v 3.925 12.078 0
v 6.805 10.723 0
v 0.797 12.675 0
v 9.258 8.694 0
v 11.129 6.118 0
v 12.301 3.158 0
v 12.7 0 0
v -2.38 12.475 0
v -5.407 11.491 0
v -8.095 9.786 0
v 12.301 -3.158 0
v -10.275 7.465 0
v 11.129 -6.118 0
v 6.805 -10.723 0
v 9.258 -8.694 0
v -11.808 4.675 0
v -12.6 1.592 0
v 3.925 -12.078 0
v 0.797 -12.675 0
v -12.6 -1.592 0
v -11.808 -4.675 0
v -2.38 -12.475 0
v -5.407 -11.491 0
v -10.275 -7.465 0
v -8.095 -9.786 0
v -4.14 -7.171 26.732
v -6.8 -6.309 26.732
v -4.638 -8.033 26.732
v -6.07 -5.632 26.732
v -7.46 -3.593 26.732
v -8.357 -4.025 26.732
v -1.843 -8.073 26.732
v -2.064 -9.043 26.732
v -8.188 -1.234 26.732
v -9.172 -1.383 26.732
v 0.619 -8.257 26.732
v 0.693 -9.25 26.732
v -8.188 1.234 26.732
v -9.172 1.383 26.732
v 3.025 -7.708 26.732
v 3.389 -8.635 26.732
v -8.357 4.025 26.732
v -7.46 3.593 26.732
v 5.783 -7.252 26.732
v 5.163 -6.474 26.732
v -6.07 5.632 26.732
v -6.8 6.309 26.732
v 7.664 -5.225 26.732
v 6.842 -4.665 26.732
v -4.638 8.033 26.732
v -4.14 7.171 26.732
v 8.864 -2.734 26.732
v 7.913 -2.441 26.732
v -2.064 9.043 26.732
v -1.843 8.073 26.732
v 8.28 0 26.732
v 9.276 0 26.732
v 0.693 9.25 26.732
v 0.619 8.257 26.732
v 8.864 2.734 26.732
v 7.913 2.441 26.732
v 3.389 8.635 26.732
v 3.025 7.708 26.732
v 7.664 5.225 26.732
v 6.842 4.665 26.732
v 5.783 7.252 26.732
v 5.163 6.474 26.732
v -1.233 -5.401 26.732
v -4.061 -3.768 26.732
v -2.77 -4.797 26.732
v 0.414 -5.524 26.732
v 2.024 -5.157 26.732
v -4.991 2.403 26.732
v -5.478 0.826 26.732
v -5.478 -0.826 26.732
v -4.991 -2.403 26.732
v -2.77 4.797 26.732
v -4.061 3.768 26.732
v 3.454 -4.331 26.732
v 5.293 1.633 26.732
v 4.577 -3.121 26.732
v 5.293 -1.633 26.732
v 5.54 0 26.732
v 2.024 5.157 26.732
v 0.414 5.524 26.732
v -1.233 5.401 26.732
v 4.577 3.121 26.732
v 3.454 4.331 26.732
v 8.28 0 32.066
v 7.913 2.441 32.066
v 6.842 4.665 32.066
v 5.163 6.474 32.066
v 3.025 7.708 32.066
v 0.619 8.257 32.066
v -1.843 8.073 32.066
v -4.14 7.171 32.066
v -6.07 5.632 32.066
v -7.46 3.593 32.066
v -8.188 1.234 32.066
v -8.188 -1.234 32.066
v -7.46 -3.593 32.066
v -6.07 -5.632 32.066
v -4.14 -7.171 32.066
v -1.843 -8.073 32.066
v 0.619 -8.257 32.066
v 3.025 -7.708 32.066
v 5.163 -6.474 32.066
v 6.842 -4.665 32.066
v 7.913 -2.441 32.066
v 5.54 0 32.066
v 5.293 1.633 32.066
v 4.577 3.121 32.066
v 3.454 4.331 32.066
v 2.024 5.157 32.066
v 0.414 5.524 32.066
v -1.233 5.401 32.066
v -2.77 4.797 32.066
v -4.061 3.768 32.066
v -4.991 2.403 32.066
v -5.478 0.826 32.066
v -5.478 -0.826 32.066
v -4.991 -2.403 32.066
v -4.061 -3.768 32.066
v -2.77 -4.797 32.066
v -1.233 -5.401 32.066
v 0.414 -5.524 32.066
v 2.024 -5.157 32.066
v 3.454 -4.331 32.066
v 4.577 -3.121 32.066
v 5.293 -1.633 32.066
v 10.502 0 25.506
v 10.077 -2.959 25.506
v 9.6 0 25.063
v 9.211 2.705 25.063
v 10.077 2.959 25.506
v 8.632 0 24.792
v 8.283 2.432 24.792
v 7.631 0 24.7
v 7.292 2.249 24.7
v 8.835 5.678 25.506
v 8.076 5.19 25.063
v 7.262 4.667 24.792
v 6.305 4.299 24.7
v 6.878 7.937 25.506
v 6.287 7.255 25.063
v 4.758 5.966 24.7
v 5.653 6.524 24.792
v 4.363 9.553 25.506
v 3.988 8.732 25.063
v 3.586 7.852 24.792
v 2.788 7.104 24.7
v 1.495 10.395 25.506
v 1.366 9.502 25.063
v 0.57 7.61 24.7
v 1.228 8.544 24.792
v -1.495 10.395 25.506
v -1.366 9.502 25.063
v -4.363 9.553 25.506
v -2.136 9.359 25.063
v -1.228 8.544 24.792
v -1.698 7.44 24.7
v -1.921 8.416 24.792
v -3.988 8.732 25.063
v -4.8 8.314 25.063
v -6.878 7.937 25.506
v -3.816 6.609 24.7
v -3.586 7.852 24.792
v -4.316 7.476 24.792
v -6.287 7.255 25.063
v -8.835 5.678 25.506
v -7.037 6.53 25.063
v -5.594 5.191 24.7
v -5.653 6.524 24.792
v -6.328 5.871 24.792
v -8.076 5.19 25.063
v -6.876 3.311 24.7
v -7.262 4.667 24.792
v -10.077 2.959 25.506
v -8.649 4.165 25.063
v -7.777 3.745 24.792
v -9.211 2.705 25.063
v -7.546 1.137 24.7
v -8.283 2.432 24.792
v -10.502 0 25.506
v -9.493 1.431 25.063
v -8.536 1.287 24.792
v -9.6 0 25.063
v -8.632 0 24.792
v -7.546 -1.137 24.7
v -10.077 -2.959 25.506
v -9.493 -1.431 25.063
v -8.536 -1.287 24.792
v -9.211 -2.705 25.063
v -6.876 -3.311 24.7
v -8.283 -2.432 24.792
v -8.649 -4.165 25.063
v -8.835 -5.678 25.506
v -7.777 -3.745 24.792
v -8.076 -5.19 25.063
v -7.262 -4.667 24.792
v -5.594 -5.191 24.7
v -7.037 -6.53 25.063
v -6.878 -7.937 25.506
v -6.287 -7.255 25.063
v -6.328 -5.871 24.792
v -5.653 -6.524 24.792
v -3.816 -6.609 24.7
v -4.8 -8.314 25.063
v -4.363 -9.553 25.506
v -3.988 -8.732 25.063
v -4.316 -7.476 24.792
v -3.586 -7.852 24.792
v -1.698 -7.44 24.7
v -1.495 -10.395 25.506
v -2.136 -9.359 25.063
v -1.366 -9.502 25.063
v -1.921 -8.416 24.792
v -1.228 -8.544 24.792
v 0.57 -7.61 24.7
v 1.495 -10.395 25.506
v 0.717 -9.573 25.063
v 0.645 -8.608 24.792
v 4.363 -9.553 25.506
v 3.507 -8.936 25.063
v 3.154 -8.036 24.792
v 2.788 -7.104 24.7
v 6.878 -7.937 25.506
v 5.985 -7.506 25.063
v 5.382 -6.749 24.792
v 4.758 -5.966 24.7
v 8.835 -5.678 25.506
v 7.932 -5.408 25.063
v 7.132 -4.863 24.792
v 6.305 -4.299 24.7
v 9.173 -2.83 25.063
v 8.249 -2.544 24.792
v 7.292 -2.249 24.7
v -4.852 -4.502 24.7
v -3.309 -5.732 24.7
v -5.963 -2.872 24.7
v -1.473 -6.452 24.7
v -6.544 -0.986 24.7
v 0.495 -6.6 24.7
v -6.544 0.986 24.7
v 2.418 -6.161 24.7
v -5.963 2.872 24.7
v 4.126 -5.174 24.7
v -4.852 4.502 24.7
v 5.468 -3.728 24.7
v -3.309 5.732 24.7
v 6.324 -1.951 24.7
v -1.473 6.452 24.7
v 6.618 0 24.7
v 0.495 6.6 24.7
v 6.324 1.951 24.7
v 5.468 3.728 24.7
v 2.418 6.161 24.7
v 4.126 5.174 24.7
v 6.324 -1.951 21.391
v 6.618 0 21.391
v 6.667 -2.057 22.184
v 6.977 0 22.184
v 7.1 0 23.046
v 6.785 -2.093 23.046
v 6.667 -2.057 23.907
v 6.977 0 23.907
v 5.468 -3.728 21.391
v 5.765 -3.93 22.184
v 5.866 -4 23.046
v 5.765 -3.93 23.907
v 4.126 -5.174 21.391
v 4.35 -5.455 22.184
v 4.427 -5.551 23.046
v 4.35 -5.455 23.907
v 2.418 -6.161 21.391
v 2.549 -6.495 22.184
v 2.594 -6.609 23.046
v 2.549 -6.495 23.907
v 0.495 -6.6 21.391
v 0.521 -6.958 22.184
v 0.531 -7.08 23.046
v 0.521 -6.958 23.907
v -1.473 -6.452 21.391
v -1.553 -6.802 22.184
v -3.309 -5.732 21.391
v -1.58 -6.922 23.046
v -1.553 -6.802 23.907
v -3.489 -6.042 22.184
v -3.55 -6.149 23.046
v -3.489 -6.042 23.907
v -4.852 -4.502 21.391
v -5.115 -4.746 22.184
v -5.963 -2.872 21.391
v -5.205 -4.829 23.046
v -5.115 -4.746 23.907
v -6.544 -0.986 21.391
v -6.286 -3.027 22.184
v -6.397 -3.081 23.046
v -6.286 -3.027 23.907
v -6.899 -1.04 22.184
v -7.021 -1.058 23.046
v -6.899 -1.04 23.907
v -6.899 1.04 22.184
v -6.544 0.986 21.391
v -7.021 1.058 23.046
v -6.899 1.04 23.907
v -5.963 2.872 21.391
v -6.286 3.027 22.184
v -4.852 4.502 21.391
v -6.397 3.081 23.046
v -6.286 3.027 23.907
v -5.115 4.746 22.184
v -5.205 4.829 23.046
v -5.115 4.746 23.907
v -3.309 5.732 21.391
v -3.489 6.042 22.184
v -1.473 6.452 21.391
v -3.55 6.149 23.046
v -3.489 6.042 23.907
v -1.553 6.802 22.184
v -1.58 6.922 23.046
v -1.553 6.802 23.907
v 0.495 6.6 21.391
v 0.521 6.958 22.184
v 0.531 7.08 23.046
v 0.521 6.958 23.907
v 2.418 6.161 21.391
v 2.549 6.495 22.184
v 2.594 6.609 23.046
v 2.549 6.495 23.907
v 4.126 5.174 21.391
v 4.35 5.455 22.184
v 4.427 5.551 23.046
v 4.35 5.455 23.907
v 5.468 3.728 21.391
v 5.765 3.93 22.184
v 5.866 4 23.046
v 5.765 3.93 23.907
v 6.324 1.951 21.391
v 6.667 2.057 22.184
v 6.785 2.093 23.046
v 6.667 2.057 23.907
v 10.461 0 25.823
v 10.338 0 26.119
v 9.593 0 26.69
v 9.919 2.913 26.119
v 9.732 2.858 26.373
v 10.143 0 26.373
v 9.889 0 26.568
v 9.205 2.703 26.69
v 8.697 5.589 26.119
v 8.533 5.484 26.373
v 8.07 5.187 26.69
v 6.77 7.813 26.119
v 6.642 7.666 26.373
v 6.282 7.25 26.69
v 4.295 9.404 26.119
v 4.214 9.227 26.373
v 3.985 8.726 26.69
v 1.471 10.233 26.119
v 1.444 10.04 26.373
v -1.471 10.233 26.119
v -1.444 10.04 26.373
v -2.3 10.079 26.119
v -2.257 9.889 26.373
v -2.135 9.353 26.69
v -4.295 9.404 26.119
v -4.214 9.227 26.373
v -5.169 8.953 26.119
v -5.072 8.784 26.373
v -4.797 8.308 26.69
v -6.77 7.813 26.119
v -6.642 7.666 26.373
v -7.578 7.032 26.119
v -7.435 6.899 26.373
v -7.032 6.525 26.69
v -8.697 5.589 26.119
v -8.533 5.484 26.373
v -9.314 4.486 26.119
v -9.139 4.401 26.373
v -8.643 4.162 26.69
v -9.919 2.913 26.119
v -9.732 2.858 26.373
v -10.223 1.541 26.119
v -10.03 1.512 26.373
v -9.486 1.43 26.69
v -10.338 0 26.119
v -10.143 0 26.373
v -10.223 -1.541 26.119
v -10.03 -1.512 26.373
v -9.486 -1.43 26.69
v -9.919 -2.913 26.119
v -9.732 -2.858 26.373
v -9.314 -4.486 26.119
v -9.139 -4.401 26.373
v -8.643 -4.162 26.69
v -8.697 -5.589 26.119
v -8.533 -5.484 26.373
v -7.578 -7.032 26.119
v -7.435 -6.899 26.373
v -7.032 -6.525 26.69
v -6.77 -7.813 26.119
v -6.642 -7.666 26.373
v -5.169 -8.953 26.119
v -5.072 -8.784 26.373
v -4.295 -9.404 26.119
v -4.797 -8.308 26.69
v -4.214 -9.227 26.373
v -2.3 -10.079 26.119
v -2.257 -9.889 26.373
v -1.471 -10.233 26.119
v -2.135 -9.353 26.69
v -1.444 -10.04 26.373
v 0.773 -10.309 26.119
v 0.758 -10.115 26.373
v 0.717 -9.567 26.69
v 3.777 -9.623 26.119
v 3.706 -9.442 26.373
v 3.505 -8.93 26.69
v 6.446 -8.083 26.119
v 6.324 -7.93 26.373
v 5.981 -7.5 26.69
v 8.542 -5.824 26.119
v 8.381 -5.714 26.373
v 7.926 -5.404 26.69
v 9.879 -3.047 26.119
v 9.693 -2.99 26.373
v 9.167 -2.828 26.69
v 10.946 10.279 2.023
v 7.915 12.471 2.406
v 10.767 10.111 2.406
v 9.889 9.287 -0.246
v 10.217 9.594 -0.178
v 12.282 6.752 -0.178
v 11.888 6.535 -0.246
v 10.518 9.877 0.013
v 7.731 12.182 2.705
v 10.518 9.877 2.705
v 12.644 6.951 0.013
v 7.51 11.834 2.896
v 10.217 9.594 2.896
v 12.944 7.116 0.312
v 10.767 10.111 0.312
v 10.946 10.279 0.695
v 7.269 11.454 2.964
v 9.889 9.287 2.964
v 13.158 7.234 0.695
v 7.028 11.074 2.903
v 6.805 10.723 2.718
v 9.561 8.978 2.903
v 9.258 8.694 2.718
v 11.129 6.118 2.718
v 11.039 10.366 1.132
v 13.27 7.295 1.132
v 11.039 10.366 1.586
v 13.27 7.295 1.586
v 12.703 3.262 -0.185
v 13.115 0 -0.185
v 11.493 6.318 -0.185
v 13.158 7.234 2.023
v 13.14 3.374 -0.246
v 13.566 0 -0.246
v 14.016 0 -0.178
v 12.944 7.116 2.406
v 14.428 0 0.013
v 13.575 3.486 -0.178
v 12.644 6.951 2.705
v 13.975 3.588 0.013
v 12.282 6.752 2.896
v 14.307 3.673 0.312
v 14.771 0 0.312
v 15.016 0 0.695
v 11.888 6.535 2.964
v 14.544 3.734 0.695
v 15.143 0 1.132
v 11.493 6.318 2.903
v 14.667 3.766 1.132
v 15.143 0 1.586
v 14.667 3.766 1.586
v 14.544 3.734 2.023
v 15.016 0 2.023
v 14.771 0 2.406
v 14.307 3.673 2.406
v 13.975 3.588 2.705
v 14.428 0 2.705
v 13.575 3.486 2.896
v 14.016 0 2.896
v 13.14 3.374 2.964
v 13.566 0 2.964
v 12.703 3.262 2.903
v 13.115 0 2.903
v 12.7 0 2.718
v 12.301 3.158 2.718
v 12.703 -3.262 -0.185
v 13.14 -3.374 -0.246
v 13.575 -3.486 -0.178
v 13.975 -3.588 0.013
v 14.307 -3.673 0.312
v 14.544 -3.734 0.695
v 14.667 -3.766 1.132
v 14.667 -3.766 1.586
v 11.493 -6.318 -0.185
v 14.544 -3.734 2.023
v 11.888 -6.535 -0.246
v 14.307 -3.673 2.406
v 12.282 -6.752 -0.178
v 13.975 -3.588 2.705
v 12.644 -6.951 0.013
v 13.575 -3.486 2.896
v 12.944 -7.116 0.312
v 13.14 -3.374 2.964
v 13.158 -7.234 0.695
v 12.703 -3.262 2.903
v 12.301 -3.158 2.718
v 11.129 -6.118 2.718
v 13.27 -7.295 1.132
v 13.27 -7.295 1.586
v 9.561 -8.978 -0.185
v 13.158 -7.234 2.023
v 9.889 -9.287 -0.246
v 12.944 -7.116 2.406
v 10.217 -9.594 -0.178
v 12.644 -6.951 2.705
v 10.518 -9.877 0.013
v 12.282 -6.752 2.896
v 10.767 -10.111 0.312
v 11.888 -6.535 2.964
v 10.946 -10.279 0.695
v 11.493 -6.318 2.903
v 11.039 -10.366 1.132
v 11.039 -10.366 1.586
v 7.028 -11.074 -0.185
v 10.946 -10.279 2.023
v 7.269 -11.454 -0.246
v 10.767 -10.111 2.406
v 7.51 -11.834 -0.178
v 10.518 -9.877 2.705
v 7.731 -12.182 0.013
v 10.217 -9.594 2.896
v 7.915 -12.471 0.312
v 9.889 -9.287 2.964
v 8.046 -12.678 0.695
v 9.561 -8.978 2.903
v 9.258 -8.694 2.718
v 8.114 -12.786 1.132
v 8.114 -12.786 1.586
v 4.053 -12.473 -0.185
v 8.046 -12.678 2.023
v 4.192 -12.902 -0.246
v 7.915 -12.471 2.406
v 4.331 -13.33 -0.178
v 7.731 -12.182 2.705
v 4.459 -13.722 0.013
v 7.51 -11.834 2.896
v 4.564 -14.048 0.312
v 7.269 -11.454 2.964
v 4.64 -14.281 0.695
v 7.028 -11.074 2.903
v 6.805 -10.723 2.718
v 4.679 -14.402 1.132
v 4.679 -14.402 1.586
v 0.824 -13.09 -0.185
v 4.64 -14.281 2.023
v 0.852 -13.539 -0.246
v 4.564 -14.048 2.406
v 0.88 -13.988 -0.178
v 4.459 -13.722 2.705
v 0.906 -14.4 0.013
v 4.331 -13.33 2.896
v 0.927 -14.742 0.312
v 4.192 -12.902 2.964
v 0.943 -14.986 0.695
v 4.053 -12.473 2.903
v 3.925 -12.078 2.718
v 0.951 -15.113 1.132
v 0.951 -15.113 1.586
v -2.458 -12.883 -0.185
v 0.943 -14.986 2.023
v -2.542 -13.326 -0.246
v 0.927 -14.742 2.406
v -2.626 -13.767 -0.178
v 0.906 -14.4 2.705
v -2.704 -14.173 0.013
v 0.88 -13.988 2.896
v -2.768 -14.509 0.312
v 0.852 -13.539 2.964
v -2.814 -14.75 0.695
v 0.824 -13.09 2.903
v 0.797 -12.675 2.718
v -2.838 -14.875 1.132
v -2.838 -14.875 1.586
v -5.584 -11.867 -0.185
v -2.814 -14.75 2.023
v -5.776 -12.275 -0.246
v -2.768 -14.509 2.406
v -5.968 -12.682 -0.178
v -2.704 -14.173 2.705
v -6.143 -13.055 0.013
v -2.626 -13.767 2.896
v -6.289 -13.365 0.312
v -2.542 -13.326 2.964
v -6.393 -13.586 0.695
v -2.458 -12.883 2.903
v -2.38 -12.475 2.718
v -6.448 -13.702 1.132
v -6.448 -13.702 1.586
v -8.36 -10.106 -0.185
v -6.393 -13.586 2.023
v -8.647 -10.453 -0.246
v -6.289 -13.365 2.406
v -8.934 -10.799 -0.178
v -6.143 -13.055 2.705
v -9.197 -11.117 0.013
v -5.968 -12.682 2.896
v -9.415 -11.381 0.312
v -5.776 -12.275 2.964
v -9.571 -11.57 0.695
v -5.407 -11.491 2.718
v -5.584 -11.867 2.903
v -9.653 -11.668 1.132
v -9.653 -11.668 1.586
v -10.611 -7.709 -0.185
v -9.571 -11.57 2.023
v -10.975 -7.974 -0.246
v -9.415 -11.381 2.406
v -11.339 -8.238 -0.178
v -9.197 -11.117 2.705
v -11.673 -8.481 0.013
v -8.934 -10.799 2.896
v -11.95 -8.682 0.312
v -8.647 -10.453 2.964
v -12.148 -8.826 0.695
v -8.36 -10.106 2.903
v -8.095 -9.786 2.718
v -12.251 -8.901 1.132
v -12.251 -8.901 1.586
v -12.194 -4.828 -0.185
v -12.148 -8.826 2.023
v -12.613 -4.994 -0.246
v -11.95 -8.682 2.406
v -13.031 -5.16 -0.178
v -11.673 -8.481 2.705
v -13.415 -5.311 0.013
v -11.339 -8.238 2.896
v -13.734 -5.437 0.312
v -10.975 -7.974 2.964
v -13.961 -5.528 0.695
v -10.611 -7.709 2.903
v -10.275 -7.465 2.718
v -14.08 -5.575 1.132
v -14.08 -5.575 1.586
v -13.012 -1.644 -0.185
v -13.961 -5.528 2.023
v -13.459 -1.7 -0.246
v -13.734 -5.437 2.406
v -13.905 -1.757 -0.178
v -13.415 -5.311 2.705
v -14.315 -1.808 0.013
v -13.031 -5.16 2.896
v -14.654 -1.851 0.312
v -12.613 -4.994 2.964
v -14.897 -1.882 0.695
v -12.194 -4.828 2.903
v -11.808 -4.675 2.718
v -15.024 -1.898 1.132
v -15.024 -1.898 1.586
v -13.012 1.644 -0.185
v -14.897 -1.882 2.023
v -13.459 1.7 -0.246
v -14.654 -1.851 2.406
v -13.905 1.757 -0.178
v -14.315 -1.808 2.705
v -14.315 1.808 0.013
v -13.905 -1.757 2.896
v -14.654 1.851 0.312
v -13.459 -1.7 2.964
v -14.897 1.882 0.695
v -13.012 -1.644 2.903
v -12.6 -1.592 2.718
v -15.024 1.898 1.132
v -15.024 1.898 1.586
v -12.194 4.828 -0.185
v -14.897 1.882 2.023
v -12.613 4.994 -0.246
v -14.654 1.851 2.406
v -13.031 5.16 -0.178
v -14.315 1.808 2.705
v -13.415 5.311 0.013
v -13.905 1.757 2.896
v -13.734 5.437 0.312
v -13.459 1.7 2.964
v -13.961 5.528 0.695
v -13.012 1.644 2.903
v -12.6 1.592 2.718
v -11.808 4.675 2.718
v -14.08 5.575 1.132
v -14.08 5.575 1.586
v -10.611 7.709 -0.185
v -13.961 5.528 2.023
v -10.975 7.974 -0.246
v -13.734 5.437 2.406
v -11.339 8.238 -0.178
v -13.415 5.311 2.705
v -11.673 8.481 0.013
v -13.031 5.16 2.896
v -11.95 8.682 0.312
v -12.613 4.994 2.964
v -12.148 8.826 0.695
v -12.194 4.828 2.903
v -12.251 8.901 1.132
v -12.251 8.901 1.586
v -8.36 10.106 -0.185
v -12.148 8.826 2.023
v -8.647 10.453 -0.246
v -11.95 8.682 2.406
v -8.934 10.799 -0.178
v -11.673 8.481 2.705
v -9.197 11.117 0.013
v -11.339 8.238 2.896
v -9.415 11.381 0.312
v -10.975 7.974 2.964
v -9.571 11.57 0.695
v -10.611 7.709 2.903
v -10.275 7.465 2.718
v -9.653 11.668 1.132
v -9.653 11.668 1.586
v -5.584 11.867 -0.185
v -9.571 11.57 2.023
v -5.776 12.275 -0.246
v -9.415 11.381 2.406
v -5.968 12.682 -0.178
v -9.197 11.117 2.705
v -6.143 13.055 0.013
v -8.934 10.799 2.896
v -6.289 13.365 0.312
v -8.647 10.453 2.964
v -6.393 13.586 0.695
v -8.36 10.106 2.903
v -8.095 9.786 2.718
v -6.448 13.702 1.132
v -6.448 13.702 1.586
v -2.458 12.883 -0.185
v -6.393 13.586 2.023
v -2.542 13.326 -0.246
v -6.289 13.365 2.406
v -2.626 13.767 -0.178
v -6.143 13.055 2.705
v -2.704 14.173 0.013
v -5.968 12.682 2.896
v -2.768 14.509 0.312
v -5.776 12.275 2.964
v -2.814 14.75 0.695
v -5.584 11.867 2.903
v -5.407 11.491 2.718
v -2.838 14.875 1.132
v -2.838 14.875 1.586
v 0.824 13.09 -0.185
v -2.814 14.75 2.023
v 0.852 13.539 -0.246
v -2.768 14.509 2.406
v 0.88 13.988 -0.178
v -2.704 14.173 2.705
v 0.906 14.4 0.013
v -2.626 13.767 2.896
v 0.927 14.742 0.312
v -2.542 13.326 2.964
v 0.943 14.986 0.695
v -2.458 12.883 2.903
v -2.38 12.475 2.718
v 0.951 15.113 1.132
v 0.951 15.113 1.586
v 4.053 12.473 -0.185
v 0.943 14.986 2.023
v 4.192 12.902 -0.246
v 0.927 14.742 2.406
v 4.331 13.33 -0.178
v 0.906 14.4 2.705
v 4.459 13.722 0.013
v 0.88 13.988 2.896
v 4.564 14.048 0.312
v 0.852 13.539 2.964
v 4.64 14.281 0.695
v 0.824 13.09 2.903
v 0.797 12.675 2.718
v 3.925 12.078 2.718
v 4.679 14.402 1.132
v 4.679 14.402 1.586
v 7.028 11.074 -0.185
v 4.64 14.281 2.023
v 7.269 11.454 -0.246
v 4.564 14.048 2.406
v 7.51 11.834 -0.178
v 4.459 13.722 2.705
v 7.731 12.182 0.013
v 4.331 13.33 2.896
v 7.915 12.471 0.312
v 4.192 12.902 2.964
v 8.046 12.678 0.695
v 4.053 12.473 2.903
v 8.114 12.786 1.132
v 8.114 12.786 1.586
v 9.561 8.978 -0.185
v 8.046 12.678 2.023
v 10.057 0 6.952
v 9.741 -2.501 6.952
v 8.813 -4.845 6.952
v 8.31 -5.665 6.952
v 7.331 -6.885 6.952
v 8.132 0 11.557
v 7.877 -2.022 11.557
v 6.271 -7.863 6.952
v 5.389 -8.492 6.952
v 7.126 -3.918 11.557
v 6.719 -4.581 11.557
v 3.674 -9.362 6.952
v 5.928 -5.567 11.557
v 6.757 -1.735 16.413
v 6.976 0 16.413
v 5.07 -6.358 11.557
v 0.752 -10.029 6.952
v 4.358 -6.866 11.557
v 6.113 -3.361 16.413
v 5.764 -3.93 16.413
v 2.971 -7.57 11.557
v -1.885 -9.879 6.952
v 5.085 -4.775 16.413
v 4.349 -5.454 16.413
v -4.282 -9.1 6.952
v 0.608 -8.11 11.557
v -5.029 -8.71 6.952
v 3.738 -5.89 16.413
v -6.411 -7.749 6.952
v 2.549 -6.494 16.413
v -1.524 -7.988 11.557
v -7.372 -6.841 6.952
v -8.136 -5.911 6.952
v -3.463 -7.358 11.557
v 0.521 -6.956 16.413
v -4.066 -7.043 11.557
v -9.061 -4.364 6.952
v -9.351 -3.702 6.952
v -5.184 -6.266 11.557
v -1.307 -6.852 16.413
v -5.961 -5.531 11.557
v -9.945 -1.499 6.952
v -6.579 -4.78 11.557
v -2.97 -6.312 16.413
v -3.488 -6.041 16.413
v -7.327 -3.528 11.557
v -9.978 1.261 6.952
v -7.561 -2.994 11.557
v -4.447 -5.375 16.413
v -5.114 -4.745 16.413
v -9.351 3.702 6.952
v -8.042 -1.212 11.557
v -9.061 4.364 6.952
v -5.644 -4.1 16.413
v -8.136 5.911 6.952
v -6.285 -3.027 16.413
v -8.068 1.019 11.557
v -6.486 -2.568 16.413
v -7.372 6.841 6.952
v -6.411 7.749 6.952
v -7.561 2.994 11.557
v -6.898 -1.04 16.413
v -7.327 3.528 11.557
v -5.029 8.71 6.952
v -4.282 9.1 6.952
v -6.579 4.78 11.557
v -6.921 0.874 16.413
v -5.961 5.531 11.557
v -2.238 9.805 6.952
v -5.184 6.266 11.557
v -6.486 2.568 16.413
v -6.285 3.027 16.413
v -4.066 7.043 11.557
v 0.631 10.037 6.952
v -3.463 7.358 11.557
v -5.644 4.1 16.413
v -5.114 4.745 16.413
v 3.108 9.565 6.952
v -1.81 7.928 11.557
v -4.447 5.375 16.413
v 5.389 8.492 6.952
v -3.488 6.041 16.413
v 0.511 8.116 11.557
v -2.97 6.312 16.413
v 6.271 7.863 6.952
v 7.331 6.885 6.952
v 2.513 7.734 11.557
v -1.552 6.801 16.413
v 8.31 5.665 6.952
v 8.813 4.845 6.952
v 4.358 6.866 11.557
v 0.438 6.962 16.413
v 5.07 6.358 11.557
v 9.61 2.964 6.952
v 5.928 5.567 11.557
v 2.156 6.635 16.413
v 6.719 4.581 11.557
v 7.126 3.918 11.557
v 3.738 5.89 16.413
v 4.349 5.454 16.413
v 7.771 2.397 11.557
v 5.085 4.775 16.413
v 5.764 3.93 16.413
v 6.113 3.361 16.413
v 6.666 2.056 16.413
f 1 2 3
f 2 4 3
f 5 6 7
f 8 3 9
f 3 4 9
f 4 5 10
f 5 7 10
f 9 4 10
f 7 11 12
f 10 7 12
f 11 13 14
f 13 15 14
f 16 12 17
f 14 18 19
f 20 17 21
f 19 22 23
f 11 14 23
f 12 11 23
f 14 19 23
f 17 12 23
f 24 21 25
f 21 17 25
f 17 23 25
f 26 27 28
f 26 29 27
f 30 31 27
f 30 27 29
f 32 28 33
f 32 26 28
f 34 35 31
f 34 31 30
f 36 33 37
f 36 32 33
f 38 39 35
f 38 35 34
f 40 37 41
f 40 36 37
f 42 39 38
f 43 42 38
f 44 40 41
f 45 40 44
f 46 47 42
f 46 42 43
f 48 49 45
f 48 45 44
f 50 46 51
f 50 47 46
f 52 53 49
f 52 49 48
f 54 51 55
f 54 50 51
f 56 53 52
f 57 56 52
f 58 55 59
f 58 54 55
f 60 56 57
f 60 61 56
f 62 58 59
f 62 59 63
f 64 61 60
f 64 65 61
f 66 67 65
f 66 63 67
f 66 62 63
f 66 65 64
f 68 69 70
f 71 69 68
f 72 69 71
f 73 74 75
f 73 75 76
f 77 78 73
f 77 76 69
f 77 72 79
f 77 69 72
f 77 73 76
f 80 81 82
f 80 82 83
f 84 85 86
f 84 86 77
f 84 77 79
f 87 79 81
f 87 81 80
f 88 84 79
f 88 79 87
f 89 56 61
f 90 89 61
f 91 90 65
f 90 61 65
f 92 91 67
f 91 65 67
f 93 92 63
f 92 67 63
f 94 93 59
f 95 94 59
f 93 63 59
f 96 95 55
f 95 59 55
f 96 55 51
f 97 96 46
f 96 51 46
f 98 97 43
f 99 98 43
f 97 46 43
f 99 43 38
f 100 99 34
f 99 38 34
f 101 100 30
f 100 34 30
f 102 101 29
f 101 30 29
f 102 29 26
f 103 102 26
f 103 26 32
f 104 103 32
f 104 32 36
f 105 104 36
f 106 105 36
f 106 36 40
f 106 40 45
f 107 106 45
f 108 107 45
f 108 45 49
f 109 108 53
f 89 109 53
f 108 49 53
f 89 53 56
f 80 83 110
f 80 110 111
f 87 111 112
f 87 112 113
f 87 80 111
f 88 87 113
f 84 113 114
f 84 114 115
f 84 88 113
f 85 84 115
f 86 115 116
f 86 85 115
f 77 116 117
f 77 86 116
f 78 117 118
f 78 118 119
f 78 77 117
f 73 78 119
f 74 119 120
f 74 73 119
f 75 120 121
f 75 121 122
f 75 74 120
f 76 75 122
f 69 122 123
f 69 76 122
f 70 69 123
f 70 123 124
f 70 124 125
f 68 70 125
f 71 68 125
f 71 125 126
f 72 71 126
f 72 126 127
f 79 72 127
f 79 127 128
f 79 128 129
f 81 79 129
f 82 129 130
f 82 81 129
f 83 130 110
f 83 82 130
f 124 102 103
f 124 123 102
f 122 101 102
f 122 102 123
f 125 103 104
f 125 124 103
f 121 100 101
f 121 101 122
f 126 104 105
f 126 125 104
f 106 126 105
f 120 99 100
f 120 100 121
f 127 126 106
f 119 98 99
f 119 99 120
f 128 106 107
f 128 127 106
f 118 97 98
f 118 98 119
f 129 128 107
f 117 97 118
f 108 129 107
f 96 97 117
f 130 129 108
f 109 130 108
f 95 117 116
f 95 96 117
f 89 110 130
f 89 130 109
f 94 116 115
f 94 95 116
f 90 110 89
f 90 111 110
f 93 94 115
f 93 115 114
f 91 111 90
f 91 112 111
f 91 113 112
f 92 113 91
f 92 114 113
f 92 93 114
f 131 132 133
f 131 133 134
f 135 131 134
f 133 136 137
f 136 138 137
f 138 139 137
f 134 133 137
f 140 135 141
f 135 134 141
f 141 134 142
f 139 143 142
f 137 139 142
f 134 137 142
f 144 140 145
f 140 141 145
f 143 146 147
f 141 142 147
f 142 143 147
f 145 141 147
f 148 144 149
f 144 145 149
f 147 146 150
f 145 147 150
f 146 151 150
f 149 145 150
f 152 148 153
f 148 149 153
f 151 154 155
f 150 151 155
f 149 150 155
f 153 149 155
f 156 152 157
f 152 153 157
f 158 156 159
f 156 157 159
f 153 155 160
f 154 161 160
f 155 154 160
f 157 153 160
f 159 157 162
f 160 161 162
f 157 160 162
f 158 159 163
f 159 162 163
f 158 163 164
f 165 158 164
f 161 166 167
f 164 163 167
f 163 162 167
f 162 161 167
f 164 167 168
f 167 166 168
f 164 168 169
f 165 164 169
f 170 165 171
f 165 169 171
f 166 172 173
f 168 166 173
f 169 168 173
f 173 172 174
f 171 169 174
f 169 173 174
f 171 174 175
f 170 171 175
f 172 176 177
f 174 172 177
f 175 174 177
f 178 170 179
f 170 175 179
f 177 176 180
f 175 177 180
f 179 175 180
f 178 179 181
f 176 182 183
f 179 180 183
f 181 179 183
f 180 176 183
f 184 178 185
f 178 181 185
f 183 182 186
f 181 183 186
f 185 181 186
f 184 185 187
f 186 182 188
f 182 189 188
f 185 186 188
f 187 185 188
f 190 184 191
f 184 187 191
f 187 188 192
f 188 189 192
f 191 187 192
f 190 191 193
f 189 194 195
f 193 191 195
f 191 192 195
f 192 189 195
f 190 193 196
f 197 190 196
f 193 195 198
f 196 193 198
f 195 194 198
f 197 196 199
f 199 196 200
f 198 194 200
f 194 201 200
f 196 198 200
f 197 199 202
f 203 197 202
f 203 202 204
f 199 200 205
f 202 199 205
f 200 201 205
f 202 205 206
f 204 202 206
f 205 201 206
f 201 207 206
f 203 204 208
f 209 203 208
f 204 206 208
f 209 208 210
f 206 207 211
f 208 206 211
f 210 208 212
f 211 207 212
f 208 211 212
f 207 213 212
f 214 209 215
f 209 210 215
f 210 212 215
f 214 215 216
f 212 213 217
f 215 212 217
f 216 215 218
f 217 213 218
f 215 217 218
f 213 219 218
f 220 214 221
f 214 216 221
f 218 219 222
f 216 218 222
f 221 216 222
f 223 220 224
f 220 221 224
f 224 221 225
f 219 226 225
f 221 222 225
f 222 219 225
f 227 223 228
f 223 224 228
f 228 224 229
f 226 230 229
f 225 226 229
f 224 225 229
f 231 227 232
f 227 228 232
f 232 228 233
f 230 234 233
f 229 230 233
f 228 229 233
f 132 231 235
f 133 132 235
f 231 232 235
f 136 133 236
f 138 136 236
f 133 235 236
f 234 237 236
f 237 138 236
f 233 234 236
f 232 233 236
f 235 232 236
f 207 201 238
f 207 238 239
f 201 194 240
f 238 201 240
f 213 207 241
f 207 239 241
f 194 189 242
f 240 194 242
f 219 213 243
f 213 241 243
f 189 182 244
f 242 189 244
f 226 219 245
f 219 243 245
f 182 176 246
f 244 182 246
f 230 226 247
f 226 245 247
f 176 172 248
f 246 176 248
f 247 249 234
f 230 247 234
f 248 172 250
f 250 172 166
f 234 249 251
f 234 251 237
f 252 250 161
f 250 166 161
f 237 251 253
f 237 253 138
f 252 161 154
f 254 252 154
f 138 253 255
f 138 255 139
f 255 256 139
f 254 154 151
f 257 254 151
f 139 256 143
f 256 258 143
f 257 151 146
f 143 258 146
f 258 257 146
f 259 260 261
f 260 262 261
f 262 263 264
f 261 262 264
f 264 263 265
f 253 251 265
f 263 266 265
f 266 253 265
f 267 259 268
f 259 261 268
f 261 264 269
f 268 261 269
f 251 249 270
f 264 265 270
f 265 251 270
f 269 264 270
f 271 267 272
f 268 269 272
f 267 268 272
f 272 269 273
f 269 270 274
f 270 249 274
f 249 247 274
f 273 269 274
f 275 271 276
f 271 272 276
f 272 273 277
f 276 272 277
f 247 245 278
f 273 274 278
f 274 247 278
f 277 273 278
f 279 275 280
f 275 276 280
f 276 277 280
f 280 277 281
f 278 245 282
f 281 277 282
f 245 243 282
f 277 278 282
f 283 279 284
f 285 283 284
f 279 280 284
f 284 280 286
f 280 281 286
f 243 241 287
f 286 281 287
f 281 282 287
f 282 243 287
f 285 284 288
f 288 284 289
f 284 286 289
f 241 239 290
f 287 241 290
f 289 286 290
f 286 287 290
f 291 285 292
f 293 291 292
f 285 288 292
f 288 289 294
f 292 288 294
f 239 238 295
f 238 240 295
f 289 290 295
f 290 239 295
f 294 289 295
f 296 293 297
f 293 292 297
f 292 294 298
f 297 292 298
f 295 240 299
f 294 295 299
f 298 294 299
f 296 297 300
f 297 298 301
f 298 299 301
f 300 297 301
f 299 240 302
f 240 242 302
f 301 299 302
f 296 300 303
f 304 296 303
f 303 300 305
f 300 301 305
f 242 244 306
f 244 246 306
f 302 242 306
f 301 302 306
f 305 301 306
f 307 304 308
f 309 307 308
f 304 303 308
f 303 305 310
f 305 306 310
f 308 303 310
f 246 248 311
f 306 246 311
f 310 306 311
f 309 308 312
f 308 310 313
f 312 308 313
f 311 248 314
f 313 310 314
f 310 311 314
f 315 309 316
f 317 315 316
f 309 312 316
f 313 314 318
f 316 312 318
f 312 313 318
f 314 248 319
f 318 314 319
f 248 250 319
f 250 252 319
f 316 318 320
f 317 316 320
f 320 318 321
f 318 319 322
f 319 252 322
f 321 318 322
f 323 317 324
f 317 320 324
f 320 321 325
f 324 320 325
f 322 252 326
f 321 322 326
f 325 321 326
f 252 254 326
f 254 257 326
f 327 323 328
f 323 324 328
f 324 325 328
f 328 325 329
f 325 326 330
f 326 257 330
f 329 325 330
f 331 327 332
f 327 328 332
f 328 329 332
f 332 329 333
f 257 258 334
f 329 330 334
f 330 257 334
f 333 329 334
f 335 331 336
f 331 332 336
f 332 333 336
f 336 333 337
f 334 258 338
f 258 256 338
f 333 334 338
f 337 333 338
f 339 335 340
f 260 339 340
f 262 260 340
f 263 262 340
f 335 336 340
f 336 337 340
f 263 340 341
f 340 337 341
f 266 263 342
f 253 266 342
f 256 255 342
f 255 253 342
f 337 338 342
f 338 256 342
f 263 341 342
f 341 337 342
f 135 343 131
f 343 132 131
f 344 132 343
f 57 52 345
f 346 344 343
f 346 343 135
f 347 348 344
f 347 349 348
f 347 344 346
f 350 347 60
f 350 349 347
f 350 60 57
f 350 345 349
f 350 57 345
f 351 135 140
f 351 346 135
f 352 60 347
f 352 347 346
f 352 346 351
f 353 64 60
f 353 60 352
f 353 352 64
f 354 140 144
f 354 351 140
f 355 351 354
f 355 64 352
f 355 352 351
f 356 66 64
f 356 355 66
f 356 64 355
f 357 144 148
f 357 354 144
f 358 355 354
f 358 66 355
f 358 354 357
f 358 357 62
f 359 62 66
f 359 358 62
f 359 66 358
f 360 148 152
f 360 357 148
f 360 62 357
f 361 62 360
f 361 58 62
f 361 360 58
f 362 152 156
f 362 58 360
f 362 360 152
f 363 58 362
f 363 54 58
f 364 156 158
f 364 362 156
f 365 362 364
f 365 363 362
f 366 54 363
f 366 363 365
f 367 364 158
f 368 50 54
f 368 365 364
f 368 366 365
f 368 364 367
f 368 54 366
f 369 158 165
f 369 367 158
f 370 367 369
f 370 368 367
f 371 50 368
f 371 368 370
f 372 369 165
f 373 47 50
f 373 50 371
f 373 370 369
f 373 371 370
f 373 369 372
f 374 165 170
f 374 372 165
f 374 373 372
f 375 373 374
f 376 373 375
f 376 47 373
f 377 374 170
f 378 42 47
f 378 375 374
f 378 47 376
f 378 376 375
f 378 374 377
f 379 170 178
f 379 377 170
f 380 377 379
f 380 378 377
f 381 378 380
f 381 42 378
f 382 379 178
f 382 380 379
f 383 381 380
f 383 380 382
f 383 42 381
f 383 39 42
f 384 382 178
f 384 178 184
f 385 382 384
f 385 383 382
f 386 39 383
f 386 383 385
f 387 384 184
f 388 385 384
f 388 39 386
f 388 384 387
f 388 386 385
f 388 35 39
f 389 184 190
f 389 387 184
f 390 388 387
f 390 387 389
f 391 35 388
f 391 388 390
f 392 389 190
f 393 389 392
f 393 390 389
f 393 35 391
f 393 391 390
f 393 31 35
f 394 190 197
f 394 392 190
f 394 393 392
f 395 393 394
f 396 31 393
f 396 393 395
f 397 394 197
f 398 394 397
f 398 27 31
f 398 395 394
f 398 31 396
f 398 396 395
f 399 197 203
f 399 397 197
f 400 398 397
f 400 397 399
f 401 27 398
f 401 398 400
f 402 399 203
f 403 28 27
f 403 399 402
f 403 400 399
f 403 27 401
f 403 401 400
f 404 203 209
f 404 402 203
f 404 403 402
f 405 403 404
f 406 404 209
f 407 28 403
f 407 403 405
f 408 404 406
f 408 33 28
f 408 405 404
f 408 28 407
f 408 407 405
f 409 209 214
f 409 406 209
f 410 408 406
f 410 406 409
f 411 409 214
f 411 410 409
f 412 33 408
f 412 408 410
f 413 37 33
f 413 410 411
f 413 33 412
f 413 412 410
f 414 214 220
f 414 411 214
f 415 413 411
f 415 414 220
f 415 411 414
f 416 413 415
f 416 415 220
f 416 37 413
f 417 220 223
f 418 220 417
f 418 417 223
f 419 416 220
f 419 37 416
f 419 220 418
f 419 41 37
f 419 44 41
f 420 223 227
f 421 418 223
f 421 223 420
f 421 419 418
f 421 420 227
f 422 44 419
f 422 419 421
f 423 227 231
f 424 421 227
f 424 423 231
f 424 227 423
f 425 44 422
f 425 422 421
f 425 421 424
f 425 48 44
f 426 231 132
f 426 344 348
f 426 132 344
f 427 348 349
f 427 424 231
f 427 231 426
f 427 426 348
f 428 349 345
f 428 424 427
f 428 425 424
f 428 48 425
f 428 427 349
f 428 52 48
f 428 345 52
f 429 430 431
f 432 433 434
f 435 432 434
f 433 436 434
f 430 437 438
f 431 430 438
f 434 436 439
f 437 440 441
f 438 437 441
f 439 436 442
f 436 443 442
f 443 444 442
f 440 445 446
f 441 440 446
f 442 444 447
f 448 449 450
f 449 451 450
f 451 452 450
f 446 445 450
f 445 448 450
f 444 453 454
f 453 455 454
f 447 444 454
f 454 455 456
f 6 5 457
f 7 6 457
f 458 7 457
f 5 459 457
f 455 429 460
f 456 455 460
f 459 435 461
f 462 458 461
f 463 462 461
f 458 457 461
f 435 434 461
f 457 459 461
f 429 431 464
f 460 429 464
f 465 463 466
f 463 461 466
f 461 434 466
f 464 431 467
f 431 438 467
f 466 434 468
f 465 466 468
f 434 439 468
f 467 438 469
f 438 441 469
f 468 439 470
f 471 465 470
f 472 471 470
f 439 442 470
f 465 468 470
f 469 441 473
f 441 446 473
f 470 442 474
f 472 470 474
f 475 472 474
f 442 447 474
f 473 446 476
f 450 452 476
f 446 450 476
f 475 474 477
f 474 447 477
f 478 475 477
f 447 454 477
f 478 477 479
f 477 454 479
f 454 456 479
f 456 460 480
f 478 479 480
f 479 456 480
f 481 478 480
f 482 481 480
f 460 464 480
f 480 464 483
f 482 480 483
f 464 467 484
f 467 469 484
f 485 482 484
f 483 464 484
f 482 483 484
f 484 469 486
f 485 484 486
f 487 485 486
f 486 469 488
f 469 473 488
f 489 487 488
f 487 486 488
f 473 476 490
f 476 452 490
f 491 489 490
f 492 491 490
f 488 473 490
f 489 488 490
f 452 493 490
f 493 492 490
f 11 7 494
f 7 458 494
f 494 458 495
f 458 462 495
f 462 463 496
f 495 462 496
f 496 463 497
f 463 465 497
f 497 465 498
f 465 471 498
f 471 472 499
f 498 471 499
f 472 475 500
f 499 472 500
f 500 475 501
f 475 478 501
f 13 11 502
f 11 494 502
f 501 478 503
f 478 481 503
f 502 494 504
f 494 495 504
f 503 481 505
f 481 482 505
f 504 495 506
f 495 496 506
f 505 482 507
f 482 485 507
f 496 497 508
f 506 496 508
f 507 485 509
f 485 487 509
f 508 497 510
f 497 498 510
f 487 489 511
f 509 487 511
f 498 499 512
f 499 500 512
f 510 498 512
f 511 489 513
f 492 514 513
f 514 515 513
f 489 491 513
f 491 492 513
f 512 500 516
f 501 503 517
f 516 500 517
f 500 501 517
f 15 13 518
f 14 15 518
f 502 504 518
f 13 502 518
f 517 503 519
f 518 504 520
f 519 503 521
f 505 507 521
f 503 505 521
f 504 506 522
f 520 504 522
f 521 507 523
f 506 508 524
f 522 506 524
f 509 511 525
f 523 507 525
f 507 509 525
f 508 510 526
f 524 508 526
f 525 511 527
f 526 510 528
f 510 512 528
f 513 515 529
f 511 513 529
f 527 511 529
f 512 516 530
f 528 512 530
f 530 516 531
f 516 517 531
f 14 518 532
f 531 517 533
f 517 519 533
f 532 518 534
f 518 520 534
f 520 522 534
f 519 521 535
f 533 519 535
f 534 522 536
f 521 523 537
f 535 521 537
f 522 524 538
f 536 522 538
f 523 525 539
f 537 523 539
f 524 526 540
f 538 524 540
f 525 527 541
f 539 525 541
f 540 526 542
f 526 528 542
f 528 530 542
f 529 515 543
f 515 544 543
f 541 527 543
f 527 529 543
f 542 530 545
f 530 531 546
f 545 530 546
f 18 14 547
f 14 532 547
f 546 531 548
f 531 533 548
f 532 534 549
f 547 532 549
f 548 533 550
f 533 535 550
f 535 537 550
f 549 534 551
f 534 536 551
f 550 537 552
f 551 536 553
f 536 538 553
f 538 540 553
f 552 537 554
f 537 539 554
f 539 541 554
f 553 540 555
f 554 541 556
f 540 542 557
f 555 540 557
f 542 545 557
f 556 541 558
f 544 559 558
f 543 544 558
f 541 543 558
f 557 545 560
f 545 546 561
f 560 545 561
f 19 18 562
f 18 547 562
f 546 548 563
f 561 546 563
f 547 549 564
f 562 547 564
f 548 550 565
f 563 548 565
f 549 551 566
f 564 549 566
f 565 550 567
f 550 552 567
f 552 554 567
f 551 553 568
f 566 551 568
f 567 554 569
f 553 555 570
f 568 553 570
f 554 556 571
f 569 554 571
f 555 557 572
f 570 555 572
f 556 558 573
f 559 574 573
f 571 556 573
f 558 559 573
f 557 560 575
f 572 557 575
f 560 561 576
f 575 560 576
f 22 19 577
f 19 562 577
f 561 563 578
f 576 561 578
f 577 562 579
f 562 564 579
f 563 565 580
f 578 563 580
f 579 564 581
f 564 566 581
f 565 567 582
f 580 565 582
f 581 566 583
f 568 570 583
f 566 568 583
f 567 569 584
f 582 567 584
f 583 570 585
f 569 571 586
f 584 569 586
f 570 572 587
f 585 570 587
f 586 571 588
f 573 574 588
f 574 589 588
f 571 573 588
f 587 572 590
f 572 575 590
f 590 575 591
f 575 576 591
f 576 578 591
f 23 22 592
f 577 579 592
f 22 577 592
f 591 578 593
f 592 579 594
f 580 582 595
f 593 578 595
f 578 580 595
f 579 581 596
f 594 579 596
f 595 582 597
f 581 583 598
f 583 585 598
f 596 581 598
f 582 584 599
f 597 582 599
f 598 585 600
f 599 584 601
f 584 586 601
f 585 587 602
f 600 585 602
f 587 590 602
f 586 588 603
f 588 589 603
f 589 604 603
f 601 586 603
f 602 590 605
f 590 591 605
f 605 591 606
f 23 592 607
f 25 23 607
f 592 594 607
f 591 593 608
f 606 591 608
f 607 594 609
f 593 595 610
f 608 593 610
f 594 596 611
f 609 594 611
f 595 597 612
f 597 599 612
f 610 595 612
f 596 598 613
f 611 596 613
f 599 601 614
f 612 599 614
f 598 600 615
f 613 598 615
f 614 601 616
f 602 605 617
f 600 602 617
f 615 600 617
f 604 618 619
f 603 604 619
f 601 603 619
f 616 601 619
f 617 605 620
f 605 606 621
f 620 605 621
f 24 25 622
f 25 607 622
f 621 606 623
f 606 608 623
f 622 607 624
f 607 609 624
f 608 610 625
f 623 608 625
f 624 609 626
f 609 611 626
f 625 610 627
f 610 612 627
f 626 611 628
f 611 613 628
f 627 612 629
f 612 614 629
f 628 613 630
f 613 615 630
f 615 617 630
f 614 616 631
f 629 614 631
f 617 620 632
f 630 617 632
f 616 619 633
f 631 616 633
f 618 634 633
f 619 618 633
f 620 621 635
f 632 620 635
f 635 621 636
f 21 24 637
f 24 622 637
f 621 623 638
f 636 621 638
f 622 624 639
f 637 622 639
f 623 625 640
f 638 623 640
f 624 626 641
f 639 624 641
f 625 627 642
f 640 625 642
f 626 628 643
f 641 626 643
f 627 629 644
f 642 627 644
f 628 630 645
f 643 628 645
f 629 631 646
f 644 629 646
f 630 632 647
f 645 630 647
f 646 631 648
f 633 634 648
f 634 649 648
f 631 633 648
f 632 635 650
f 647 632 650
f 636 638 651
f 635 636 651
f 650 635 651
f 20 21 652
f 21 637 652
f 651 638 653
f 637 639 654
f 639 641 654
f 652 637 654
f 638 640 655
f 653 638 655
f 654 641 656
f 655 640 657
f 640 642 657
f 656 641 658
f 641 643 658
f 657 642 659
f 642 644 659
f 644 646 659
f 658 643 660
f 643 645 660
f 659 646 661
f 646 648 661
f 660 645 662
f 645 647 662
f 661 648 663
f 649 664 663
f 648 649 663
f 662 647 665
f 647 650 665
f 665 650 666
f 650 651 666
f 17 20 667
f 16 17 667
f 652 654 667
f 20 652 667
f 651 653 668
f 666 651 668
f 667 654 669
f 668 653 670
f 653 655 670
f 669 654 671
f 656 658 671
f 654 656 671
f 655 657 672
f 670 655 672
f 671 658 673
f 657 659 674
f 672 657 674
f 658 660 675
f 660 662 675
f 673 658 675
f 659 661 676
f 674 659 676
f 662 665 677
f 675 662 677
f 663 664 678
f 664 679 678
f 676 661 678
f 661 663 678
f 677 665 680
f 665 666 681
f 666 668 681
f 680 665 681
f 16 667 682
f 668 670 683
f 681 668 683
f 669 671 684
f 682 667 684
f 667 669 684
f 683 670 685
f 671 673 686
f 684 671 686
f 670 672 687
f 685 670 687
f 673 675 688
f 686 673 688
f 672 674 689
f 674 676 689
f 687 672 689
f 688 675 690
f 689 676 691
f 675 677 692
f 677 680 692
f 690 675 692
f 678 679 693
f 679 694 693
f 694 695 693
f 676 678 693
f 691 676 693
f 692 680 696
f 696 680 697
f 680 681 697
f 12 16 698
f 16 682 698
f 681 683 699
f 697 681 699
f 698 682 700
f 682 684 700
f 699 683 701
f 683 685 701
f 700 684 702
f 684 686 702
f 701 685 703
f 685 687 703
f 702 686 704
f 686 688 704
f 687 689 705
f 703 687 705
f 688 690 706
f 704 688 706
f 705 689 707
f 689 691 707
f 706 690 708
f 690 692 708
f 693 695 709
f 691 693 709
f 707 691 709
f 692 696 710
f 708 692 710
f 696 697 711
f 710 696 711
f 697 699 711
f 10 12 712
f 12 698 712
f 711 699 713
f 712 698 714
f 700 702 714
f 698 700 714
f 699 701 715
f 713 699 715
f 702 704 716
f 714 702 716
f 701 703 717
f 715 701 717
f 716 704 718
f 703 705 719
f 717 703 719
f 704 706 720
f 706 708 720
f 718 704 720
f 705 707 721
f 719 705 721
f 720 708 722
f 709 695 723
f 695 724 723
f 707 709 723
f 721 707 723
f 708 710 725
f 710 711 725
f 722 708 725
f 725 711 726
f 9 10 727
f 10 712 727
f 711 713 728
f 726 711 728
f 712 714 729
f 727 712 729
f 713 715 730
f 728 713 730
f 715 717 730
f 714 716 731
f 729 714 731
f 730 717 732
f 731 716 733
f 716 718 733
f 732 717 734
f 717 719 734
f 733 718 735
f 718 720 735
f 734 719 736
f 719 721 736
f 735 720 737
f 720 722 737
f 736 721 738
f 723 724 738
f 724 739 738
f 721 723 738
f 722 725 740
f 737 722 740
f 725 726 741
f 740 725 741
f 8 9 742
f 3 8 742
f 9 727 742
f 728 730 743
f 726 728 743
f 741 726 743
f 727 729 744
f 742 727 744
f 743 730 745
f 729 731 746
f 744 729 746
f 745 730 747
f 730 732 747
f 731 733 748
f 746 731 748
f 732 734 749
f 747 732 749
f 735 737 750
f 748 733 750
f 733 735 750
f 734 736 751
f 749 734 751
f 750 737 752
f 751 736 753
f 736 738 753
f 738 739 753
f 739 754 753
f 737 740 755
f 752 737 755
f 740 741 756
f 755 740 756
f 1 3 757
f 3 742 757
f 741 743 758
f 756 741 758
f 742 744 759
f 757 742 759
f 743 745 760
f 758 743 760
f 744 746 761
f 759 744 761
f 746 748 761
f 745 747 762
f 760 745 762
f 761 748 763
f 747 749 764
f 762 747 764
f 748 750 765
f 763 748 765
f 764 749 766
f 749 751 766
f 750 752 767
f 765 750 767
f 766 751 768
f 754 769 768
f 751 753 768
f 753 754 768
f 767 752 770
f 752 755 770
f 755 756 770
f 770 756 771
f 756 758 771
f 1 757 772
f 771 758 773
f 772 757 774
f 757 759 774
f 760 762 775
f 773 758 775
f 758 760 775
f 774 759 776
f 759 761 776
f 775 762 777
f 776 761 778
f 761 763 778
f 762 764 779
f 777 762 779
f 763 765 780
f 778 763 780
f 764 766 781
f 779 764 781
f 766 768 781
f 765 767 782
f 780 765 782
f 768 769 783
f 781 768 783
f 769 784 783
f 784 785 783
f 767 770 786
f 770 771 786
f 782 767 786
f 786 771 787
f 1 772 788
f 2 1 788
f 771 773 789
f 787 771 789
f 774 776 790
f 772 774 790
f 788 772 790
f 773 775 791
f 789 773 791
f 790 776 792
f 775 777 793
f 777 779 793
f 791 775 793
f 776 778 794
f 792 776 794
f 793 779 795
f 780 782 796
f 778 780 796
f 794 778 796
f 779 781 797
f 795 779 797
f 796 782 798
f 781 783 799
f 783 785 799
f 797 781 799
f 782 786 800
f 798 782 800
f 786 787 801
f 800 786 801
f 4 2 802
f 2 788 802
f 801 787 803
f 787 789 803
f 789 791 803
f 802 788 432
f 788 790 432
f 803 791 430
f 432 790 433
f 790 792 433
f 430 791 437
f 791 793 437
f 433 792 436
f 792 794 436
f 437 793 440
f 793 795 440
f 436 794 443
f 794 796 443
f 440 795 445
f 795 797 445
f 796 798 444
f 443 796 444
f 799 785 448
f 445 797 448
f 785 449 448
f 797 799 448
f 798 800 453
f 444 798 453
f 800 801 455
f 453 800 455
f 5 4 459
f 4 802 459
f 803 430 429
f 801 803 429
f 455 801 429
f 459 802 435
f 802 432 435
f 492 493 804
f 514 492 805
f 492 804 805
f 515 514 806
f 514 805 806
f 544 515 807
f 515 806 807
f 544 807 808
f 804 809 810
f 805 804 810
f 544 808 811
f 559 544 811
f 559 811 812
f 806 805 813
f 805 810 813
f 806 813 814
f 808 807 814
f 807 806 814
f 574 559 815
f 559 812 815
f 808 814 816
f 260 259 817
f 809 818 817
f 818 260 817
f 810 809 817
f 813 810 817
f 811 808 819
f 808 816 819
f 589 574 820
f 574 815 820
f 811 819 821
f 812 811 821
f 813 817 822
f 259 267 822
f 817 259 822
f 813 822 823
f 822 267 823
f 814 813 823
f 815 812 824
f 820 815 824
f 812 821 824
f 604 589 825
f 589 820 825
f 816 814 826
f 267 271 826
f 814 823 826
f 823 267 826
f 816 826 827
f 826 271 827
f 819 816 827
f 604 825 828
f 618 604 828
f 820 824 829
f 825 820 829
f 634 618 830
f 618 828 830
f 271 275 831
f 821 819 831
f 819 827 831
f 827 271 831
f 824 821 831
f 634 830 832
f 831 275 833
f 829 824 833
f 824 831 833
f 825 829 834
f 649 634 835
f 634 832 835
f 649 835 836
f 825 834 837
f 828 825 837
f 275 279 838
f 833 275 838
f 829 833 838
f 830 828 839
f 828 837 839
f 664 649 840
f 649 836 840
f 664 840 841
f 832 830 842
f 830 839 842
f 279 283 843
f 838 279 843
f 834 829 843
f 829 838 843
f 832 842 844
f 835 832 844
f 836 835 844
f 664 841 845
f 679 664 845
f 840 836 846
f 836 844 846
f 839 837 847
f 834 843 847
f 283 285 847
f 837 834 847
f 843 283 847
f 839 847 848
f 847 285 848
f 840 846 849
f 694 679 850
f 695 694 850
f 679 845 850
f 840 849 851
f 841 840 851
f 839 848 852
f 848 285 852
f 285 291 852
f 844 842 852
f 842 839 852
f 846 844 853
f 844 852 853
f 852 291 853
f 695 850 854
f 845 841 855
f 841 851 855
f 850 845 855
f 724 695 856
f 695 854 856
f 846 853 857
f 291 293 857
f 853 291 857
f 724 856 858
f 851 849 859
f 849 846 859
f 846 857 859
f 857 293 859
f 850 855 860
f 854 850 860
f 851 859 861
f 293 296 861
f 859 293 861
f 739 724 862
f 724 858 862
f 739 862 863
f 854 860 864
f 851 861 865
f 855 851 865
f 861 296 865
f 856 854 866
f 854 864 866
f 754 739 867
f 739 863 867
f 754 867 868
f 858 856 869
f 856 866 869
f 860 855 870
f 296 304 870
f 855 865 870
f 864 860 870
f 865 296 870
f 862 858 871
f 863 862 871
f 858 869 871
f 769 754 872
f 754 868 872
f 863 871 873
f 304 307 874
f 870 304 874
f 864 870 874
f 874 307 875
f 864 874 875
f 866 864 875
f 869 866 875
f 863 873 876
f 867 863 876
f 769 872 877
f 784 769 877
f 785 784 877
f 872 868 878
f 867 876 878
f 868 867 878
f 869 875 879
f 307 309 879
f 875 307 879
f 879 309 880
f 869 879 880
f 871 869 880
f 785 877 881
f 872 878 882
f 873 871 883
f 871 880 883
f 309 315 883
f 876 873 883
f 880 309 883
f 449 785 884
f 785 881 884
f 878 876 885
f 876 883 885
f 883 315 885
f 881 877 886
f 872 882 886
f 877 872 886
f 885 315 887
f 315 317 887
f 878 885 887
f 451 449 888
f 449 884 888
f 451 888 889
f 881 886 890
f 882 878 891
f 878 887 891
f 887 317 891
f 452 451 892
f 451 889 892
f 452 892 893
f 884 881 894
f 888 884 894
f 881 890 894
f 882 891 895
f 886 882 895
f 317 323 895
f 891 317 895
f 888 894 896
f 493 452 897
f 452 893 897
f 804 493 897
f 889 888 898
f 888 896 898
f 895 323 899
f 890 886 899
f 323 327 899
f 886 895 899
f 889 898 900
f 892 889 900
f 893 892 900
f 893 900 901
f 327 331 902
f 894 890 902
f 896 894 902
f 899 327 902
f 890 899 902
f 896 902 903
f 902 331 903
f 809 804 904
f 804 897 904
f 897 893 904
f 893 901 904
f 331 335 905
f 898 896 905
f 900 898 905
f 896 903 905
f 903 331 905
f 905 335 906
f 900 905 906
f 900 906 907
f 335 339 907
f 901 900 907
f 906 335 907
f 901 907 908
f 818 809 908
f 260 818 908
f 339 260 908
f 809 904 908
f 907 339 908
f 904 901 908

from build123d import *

# Parameters (mm, degrees)
F2_R     = 10.5023561171
F3_DEPTH = 2.032
F4_R     = 1.2264204897
F6_R     = 8.280415088
F6_R_2   = 5.5395009723
F7_DEPTH = 5.334


# Not quite as in the source:
# - a fillet or chamfer that OpenCascade refuses, or shapes differently, is made with other operations: its cross-section is extruded or revolved along the edge and cut away or added


with BuildPart() as f1:
    # F0 (on Front) → F1 (revolve)
    with BuildSketch(Plane.XZ):
        with BuildLine():
            Line((0, 24.7002821416), (0, 0))
            Line((0, 0), (12.7, 0))
            ThreePointArc((12.7, 0), (15.1592770153, 1.3591062743), (12.7, 2.7182125486))
            ThreePointArc((12.7, 2.7182125486), (8.1323573281, 11.5574154189), (6.618256215, 21.3911514729))
            ThreePointArc((6.618256215, 21.3911514729), (7.1000680202, 23.0457168072), (6.618256215, 24.7002821416))
            Line((6.618256215, 24.7002821416), (0, 24.7002821416))
        make_face()
    revolve(axis=Axis((0, 0, 12.3501410708), (0, 0, -1)))

    # F2 (on face) → F3 (join)
    with BuildSketch(Plane.XY.offset(24.7002821416)):
        Circle(F2_R)
    extrude(amount=F3_DEPTH)

    # F4
    f4_edges = [f1.edges().sort_by_distance(p)[0] for p in [
        (-10.502356, 0, 26.732282),
    ]]
    fillet(f4_edges, radius=F4_R)

    # F5: fillet of radius 5.5188922036 on 1 edges, made by hand

    # F5_s1 → F5_t2 (revolve, cut)
    with BuildSketch(Plane.XZ):
        with BuildLine():
            ThreePointArc((10.5023561171, 25.5058616519), (9.1222760715, 24.9054922023), (7.631318916, 24.7002821416))
            Line((7.631318916, 24.7002821416), (7.631318916, 24.5899042975))
            Line((7.631318916, 24.5899042975), (10.5023561171, 24.5899042975))
            Line((10.5023561171, 24.5899042975), (10.6127339612, 24.7002821416))
            ThreePointArc((10.6127339612, 24.7002821416), (10.6127339612, 25.1030718967), (10.5597768612, 25.411595398))
            Line((10.5597768612, 25.411595398), (10.5023561171, 25.5058616519))
        make_face()
    revolve(axis=Axis((0, 0, 24.7002821416), (0, 0, 1)), mode=Mode.SUBTRACT)

    # F6 (on face) → F7 (join)
    with BuildSketch(Plane.XY.offset(26.7322821416)):
        Circle(F6_R)
        Circle(F6_R_2, mode=Mode.SUBTRACT)
    extrude(amount=F7_DEPTH)


solid = f1.part
